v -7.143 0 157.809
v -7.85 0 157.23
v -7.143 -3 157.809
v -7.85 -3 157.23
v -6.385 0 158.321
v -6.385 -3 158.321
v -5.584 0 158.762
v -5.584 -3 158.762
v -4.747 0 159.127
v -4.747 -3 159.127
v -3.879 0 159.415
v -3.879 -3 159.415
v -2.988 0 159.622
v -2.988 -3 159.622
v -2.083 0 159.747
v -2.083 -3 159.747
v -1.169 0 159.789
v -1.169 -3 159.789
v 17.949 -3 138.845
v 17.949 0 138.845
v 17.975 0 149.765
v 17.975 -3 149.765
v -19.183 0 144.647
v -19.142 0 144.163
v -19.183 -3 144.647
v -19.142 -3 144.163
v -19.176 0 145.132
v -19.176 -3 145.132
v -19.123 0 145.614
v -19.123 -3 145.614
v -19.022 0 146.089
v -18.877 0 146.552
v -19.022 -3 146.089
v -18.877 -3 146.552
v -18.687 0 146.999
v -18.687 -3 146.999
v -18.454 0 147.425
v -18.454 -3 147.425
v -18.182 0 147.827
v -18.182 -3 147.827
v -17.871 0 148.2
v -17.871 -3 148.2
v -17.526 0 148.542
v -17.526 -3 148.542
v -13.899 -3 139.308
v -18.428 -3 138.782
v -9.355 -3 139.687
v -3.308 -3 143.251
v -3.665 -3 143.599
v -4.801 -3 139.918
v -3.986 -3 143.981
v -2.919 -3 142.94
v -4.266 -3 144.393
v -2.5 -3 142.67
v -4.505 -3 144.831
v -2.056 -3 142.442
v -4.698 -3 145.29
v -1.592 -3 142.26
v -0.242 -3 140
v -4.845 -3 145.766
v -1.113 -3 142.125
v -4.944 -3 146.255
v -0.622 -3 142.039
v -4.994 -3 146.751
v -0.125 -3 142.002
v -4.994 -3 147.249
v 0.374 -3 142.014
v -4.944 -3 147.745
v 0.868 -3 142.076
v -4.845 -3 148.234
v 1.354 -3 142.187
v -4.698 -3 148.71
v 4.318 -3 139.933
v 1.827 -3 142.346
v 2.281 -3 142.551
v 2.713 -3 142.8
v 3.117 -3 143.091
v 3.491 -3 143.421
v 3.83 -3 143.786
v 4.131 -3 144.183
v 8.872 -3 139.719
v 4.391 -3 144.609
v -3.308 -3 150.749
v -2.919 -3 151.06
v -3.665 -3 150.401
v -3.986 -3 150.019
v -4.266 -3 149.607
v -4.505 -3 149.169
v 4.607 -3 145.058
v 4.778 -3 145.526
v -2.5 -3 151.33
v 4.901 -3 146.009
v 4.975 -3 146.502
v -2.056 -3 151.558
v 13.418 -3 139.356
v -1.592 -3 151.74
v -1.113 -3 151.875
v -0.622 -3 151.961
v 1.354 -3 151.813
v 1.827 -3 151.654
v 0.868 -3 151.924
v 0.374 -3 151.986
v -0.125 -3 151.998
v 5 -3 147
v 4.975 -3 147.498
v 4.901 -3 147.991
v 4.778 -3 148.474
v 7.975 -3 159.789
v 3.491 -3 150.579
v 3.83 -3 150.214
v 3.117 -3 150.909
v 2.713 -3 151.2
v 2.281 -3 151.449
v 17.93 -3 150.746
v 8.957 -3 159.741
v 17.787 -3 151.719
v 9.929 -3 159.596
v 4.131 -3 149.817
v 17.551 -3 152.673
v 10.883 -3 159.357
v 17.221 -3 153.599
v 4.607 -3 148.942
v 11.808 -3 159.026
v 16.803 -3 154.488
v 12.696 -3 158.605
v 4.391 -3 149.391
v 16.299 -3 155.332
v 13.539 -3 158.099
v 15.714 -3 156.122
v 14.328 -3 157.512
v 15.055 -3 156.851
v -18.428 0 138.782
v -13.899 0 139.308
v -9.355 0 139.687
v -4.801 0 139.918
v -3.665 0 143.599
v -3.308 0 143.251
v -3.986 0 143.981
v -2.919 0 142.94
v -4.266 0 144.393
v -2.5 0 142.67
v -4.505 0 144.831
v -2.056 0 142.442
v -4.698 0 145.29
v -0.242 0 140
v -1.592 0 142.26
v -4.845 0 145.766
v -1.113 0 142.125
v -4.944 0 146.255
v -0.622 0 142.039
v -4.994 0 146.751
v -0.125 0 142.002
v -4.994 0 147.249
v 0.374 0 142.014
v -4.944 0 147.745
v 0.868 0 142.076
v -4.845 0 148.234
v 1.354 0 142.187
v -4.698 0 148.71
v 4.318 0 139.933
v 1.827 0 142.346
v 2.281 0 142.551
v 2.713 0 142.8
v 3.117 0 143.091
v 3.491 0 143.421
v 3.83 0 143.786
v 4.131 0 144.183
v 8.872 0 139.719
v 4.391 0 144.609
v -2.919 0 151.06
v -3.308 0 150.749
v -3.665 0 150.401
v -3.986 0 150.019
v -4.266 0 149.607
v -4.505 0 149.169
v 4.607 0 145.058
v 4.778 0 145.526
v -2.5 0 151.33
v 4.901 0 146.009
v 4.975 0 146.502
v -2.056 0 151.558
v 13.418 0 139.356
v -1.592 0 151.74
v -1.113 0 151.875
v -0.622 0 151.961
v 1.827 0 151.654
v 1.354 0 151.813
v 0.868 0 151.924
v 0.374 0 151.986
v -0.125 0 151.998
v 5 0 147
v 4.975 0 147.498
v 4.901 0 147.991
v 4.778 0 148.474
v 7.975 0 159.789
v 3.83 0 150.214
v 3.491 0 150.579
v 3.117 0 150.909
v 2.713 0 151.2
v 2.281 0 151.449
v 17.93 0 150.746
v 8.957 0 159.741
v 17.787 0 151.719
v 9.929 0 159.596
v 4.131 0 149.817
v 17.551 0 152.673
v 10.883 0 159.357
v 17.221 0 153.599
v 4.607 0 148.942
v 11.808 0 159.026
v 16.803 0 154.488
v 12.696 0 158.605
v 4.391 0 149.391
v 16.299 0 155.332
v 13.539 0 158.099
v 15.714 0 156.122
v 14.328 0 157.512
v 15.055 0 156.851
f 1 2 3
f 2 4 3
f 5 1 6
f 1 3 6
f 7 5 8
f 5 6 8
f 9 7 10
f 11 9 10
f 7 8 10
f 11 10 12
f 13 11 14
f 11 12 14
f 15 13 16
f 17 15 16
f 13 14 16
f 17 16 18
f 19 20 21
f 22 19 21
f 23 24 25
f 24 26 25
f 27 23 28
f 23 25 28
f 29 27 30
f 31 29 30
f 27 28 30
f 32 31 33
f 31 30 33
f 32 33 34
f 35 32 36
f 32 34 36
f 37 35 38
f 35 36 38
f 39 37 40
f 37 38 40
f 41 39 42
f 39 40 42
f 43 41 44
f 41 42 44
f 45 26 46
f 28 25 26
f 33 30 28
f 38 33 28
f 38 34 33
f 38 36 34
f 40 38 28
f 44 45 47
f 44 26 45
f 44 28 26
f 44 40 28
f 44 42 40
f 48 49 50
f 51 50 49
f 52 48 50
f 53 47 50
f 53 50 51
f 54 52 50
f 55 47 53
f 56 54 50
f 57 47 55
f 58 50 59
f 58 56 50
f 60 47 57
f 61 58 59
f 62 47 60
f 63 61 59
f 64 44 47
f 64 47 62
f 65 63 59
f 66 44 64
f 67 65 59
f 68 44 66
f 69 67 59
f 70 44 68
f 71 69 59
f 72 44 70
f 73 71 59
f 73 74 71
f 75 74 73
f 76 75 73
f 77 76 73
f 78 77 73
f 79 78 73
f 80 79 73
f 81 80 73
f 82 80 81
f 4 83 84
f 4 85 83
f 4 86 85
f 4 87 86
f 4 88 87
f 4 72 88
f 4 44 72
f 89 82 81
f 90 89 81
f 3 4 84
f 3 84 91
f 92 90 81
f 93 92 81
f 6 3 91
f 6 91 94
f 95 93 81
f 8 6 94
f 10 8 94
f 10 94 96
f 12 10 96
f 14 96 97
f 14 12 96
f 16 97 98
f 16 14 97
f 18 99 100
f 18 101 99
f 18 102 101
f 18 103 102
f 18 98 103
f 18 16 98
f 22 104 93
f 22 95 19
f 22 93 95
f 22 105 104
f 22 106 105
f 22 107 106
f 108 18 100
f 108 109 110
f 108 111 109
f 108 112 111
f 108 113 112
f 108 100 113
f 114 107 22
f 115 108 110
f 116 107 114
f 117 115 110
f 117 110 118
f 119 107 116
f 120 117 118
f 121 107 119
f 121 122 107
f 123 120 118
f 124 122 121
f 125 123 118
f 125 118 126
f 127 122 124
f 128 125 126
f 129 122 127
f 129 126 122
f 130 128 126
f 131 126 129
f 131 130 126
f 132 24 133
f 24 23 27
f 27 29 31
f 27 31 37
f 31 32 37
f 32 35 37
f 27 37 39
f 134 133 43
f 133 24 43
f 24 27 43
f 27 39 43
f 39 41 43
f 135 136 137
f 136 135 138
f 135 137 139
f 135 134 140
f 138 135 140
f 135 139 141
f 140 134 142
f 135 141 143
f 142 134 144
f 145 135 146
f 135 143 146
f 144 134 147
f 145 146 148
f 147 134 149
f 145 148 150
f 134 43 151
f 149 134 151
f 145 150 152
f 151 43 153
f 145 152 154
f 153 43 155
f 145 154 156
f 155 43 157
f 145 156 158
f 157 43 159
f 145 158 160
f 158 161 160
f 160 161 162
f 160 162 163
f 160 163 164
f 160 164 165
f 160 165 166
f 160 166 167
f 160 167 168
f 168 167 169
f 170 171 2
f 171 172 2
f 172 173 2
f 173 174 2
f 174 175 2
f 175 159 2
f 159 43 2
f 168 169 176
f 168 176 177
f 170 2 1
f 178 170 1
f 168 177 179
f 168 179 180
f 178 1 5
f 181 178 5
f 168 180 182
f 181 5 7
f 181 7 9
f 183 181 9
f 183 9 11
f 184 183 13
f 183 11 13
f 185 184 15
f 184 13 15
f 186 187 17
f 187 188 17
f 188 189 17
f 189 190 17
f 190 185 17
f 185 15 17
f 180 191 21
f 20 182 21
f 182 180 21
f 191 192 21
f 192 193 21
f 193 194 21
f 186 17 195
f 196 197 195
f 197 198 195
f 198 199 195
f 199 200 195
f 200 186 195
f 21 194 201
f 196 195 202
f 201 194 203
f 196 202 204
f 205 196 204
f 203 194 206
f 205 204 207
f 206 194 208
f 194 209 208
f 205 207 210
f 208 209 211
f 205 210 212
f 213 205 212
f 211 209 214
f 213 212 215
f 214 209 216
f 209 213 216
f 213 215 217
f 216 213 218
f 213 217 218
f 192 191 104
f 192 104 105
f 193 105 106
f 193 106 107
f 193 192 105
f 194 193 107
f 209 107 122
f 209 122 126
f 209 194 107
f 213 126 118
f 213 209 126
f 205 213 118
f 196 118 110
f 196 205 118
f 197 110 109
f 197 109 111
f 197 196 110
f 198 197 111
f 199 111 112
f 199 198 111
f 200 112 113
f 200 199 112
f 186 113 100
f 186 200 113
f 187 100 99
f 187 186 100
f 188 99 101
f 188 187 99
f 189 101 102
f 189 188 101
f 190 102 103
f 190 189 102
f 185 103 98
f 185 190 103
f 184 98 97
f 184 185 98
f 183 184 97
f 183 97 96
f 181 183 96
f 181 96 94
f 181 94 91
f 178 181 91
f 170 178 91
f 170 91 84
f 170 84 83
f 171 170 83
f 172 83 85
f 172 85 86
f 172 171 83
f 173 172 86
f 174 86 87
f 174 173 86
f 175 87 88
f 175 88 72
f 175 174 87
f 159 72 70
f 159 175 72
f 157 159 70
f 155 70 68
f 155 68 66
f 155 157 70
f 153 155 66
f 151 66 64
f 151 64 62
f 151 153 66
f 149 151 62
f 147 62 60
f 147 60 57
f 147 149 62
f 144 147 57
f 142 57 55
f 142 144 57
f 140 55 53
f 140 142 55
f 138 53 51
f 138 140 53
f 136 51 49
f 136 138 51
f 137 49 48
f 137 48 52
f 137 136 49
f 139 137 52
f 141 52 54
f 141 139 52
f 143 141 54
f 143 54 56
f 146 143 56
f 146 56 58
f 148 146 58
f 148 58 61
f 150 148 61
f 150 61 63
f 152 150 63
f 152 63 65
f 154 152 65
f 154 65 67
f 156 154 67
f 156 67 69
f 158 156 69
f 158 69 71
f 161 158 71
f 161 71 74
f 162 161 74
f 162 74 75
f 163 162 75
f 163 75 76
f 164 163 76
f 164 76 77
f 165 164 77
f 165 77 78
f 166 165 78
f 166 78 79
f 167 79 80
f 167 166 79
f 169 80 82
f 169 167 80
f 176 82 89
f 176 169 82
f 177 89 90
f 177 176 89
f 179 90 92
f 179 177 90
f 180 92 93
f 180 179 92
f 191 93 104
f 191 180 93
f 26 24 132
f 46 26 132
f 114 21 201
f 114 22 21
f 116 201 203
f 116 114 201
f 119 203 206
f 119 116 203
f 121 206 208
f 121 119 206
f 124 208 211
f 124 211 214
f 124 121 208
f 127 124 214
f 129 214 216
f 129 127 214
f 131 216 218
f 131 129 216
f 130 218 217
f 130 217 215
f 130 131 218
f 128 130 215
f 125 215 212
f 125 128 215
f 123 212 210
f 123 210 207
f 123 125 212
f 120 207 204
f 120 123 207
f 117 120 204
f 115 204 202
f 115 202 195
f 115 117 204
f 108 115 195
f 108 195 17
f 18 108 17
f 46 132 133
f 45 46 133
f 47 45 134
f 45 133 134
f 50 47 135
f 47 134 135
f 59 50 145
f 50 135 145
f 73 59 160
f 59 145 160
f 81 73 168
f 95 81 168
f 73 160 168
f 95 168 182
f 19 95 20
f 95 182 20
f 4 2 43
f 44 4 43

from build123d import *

# Parameters (mm, degrees)
F0_R     = 5
F1_DEPTH = 3
F2_R     = 10
F3_R     = 5


with BuildPart() as f1:
    # F0 (on Front) → F1 (new body)
    with BuildSketch(Plane.XZ):
        with BuildLine():
            ThreePointArc((-18.427902, 138.781888), (-0.24164, 139.999791), (17.948718, 138.844674))
            Line((17.948718, 138.844674), (18, 159.789056))
            Line((18, 159.789056), (0, 159.789056))
            Line((0, 159.789056), (-5, 159.789056))
            Line((-5, 159.789056), (-19.489739, 146.778655))
            Line((-19.489739, 146.778655), (-18.427902, 138.781888))
        make_face()
        with Locations((0, 147)):
            Circle(F0_R, mode=Mode.SUBTRACT)
    extrude(amount=F1_DEPTH)

    # F2
    f2_edges = [f1.edges().sort_by_distance(p)[0] for p in [
        (18, -1.5, 159.789056),
        (-5, -1.5, 159.789056),
    ]]
    fillet(f2_edges, radius=F2_R)

    # F3
    f3_edges = [f1.edges().sort_by_distance(p)[0] for p in [
        (-19.489739, -1.5, 146.778655),
    ]]
    fillet(f3_edges, radius=F3_R)


solid = f1.part
